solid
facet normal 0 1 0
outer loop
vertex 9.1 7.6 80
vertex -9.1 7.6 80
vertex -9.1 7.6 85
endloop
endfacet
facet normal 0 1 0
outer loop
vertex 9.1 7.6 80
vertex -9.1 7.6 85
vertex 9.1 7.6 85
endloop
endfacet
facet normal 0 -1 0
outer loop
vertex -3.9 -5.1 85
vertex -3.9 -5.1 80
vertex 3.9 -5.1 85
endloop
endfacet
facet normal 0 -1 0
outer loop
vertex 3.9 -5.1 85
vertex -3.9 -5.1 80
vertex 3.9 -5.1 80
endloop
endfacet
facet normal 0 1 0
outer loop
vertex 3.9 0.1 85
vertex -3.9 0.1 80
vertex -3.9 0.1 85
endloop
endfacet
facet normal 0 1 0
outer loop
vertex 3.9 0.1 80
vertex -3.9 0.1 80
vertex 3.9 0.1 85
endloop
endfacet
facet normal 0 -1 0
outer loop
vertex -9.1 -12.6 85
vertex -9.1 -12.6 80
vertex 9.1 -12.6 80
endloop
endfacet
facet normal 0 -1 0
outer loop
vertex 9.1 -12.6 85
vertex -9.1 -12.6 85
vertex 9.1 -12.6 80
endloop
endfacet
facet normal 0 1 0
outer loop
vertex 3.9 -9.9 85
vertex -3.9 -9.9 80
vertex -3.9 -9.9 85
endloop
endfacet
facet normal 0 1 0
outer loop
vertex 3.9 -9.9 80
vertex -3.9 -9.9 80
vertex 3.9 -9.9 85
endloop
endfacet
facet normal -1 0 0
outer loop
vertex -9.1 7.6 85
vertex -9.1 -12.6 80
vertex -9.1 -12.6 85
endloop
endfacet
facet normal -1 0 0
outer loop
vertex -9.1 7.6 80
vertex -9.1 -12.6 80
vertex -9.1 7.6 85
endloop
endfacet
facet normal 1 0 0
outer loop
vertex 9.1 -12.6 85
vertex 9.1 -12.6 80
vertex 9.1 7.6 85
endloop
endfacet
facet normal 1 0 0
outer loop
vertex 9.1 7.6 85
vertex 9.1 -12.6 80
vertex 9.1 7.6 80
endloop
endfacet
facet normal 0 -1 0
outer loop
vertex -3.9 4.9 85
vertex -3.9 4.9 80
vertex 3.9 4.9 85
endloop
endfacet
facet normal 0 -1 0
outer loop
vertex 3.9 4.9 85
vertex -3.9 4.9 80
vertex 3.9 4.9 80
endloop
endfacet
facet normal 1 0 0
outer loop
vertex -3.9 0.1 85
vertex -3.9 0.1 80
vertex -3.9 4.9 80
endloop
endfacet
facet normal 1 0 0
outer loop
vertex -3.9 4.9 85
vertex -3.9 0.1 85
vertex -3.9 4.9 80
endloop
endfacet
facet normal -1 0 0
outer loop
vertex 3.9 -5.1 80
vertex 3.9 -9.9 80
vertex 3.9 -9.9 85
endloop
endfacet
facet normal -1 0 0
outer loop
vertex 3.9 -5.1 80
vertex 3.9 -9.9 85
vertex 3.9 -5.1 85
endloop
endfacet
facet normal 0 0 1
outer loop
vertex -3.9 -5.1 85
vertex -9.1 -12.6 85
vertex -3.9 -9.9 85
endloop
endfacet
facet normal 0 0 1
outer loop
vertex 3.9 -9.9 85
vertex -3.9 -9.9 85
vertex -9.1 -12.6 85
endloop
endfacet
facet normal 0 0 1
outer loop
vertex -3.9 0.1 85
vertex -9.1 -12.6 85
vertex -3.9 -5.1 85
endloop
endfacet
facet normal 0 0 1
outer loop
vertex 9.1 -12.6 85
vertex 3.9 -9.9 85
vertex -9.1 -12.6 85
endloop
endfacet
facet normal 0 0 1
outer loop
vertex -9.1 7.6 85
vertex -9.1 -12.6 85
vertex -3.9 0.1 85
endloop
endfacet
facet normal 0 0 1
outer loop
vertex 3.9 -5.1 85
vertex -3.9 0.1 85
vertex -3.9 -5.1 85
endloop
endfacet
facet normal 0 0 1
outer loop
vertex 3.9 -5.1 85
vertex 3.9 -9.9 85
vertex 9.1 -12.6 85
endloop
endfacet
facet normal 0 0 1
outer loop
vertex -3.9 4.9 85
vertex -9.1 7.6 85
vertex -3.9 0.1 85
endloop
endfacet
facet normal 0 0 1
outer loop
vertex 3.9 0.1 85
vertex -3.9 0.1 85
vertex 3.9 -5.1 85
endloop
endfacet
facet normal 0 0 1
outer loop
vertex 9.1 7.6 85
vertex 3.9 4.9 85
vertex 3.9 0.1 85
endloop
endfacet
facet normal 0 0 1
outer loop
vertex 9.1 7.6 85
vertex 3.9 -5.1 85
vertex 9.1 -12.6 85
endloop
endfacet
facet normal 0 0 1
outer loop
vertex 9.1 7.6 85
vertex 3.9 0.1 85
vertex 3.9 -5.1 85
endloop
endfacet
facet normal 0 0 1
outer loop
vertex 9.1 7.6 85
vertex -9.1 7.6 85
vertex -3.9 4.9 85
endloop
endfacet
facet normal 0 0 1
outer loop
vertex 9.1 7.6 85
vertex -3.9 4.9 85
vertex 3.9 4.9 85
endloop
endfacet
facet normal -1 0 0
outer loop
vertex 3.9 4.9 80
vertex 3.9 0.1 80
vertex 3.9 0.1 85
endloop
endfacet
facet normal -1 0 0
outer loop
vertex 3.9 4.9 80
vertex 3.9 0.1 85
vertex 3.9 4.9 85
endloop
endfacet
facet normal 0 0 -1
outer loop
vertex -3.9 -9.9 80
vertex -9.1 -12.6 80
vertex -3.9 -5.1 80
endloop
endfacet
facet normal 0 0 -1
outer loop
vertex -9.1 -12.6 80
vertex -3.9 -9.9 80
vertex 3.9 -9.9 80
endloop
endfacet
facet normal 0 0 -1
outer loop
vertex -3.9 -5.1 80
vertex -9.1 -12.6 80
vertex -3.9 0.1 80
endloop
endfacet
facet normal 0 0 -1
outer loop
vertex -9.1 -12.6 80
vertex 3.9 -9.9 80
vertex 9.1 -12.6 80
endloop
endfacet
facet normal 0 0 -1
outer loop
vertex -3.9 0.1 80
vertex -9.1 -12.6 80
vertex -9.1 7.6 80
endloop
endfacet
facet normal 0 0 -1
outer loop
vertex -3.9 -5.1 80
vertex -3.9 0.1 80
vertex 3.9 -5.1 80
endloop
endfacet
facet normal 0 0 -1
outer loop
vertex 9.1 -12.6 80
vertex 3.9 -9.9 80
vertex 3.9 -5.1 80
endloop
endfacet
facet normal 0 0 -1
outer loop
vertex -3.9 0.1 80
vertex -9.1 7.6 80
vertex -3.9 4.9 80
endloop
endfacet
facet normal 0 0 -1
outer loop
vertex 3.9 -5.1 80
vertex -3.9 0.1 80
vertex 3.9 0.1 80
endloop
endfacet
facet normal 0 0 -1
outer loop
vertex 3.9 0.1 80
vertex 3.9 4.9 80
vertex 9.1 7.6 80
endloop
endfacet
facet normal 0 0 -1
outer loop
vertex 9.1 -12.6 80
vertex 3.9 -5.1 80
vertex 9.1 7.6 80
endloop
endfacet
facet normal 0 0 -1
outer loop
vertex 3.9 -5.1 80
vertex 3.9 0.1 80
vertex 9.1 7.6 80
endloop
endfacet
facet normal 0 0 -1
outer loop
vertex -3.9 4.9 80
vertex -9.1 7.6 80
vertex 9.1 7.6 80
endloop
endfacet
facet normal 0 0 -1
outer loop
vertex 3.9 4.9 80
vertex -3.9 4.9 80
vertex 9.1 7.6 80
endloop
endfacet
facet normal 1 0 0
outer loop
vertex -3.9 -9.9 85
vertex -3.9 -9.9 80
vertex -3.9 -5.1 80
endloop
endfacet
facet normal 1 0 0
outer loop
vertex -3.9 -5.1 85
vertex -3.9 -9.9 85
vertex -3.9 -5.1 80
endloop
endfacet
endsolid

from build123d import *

# Parameters (mm, degrees)
SKETCH013_W   = 18.2
SKETCH013_H   = 20.2
SKETCH013_W_2 = 7.8
SKETCH013_H_2 = 4.8
PAD013_DEPTH  = 5


with BuildPart() as part:
    # Sketch013 → Pad013 (new body)
    with BuildSketch(Plane(origin=(0, -2.5, 80), x_dir=(1, 0, 0), z_dir=(0, 0, 1))):
        Rectangle(SKETCH013_W, SKETCH013_H)
        with Locations((0, 5)):
            Rectangle(SKETCH013_W_2, SKETCH013_H_2, mode=Mode.SUBTRACT)
        with Locations((0, -5)):
            Rectangle(SKETCH013_W_2, SKETCH013_H_2, mode=Mode.SUBTRACT)
    extrude(amount=PAD013_DEPTH)


solid = part.part
